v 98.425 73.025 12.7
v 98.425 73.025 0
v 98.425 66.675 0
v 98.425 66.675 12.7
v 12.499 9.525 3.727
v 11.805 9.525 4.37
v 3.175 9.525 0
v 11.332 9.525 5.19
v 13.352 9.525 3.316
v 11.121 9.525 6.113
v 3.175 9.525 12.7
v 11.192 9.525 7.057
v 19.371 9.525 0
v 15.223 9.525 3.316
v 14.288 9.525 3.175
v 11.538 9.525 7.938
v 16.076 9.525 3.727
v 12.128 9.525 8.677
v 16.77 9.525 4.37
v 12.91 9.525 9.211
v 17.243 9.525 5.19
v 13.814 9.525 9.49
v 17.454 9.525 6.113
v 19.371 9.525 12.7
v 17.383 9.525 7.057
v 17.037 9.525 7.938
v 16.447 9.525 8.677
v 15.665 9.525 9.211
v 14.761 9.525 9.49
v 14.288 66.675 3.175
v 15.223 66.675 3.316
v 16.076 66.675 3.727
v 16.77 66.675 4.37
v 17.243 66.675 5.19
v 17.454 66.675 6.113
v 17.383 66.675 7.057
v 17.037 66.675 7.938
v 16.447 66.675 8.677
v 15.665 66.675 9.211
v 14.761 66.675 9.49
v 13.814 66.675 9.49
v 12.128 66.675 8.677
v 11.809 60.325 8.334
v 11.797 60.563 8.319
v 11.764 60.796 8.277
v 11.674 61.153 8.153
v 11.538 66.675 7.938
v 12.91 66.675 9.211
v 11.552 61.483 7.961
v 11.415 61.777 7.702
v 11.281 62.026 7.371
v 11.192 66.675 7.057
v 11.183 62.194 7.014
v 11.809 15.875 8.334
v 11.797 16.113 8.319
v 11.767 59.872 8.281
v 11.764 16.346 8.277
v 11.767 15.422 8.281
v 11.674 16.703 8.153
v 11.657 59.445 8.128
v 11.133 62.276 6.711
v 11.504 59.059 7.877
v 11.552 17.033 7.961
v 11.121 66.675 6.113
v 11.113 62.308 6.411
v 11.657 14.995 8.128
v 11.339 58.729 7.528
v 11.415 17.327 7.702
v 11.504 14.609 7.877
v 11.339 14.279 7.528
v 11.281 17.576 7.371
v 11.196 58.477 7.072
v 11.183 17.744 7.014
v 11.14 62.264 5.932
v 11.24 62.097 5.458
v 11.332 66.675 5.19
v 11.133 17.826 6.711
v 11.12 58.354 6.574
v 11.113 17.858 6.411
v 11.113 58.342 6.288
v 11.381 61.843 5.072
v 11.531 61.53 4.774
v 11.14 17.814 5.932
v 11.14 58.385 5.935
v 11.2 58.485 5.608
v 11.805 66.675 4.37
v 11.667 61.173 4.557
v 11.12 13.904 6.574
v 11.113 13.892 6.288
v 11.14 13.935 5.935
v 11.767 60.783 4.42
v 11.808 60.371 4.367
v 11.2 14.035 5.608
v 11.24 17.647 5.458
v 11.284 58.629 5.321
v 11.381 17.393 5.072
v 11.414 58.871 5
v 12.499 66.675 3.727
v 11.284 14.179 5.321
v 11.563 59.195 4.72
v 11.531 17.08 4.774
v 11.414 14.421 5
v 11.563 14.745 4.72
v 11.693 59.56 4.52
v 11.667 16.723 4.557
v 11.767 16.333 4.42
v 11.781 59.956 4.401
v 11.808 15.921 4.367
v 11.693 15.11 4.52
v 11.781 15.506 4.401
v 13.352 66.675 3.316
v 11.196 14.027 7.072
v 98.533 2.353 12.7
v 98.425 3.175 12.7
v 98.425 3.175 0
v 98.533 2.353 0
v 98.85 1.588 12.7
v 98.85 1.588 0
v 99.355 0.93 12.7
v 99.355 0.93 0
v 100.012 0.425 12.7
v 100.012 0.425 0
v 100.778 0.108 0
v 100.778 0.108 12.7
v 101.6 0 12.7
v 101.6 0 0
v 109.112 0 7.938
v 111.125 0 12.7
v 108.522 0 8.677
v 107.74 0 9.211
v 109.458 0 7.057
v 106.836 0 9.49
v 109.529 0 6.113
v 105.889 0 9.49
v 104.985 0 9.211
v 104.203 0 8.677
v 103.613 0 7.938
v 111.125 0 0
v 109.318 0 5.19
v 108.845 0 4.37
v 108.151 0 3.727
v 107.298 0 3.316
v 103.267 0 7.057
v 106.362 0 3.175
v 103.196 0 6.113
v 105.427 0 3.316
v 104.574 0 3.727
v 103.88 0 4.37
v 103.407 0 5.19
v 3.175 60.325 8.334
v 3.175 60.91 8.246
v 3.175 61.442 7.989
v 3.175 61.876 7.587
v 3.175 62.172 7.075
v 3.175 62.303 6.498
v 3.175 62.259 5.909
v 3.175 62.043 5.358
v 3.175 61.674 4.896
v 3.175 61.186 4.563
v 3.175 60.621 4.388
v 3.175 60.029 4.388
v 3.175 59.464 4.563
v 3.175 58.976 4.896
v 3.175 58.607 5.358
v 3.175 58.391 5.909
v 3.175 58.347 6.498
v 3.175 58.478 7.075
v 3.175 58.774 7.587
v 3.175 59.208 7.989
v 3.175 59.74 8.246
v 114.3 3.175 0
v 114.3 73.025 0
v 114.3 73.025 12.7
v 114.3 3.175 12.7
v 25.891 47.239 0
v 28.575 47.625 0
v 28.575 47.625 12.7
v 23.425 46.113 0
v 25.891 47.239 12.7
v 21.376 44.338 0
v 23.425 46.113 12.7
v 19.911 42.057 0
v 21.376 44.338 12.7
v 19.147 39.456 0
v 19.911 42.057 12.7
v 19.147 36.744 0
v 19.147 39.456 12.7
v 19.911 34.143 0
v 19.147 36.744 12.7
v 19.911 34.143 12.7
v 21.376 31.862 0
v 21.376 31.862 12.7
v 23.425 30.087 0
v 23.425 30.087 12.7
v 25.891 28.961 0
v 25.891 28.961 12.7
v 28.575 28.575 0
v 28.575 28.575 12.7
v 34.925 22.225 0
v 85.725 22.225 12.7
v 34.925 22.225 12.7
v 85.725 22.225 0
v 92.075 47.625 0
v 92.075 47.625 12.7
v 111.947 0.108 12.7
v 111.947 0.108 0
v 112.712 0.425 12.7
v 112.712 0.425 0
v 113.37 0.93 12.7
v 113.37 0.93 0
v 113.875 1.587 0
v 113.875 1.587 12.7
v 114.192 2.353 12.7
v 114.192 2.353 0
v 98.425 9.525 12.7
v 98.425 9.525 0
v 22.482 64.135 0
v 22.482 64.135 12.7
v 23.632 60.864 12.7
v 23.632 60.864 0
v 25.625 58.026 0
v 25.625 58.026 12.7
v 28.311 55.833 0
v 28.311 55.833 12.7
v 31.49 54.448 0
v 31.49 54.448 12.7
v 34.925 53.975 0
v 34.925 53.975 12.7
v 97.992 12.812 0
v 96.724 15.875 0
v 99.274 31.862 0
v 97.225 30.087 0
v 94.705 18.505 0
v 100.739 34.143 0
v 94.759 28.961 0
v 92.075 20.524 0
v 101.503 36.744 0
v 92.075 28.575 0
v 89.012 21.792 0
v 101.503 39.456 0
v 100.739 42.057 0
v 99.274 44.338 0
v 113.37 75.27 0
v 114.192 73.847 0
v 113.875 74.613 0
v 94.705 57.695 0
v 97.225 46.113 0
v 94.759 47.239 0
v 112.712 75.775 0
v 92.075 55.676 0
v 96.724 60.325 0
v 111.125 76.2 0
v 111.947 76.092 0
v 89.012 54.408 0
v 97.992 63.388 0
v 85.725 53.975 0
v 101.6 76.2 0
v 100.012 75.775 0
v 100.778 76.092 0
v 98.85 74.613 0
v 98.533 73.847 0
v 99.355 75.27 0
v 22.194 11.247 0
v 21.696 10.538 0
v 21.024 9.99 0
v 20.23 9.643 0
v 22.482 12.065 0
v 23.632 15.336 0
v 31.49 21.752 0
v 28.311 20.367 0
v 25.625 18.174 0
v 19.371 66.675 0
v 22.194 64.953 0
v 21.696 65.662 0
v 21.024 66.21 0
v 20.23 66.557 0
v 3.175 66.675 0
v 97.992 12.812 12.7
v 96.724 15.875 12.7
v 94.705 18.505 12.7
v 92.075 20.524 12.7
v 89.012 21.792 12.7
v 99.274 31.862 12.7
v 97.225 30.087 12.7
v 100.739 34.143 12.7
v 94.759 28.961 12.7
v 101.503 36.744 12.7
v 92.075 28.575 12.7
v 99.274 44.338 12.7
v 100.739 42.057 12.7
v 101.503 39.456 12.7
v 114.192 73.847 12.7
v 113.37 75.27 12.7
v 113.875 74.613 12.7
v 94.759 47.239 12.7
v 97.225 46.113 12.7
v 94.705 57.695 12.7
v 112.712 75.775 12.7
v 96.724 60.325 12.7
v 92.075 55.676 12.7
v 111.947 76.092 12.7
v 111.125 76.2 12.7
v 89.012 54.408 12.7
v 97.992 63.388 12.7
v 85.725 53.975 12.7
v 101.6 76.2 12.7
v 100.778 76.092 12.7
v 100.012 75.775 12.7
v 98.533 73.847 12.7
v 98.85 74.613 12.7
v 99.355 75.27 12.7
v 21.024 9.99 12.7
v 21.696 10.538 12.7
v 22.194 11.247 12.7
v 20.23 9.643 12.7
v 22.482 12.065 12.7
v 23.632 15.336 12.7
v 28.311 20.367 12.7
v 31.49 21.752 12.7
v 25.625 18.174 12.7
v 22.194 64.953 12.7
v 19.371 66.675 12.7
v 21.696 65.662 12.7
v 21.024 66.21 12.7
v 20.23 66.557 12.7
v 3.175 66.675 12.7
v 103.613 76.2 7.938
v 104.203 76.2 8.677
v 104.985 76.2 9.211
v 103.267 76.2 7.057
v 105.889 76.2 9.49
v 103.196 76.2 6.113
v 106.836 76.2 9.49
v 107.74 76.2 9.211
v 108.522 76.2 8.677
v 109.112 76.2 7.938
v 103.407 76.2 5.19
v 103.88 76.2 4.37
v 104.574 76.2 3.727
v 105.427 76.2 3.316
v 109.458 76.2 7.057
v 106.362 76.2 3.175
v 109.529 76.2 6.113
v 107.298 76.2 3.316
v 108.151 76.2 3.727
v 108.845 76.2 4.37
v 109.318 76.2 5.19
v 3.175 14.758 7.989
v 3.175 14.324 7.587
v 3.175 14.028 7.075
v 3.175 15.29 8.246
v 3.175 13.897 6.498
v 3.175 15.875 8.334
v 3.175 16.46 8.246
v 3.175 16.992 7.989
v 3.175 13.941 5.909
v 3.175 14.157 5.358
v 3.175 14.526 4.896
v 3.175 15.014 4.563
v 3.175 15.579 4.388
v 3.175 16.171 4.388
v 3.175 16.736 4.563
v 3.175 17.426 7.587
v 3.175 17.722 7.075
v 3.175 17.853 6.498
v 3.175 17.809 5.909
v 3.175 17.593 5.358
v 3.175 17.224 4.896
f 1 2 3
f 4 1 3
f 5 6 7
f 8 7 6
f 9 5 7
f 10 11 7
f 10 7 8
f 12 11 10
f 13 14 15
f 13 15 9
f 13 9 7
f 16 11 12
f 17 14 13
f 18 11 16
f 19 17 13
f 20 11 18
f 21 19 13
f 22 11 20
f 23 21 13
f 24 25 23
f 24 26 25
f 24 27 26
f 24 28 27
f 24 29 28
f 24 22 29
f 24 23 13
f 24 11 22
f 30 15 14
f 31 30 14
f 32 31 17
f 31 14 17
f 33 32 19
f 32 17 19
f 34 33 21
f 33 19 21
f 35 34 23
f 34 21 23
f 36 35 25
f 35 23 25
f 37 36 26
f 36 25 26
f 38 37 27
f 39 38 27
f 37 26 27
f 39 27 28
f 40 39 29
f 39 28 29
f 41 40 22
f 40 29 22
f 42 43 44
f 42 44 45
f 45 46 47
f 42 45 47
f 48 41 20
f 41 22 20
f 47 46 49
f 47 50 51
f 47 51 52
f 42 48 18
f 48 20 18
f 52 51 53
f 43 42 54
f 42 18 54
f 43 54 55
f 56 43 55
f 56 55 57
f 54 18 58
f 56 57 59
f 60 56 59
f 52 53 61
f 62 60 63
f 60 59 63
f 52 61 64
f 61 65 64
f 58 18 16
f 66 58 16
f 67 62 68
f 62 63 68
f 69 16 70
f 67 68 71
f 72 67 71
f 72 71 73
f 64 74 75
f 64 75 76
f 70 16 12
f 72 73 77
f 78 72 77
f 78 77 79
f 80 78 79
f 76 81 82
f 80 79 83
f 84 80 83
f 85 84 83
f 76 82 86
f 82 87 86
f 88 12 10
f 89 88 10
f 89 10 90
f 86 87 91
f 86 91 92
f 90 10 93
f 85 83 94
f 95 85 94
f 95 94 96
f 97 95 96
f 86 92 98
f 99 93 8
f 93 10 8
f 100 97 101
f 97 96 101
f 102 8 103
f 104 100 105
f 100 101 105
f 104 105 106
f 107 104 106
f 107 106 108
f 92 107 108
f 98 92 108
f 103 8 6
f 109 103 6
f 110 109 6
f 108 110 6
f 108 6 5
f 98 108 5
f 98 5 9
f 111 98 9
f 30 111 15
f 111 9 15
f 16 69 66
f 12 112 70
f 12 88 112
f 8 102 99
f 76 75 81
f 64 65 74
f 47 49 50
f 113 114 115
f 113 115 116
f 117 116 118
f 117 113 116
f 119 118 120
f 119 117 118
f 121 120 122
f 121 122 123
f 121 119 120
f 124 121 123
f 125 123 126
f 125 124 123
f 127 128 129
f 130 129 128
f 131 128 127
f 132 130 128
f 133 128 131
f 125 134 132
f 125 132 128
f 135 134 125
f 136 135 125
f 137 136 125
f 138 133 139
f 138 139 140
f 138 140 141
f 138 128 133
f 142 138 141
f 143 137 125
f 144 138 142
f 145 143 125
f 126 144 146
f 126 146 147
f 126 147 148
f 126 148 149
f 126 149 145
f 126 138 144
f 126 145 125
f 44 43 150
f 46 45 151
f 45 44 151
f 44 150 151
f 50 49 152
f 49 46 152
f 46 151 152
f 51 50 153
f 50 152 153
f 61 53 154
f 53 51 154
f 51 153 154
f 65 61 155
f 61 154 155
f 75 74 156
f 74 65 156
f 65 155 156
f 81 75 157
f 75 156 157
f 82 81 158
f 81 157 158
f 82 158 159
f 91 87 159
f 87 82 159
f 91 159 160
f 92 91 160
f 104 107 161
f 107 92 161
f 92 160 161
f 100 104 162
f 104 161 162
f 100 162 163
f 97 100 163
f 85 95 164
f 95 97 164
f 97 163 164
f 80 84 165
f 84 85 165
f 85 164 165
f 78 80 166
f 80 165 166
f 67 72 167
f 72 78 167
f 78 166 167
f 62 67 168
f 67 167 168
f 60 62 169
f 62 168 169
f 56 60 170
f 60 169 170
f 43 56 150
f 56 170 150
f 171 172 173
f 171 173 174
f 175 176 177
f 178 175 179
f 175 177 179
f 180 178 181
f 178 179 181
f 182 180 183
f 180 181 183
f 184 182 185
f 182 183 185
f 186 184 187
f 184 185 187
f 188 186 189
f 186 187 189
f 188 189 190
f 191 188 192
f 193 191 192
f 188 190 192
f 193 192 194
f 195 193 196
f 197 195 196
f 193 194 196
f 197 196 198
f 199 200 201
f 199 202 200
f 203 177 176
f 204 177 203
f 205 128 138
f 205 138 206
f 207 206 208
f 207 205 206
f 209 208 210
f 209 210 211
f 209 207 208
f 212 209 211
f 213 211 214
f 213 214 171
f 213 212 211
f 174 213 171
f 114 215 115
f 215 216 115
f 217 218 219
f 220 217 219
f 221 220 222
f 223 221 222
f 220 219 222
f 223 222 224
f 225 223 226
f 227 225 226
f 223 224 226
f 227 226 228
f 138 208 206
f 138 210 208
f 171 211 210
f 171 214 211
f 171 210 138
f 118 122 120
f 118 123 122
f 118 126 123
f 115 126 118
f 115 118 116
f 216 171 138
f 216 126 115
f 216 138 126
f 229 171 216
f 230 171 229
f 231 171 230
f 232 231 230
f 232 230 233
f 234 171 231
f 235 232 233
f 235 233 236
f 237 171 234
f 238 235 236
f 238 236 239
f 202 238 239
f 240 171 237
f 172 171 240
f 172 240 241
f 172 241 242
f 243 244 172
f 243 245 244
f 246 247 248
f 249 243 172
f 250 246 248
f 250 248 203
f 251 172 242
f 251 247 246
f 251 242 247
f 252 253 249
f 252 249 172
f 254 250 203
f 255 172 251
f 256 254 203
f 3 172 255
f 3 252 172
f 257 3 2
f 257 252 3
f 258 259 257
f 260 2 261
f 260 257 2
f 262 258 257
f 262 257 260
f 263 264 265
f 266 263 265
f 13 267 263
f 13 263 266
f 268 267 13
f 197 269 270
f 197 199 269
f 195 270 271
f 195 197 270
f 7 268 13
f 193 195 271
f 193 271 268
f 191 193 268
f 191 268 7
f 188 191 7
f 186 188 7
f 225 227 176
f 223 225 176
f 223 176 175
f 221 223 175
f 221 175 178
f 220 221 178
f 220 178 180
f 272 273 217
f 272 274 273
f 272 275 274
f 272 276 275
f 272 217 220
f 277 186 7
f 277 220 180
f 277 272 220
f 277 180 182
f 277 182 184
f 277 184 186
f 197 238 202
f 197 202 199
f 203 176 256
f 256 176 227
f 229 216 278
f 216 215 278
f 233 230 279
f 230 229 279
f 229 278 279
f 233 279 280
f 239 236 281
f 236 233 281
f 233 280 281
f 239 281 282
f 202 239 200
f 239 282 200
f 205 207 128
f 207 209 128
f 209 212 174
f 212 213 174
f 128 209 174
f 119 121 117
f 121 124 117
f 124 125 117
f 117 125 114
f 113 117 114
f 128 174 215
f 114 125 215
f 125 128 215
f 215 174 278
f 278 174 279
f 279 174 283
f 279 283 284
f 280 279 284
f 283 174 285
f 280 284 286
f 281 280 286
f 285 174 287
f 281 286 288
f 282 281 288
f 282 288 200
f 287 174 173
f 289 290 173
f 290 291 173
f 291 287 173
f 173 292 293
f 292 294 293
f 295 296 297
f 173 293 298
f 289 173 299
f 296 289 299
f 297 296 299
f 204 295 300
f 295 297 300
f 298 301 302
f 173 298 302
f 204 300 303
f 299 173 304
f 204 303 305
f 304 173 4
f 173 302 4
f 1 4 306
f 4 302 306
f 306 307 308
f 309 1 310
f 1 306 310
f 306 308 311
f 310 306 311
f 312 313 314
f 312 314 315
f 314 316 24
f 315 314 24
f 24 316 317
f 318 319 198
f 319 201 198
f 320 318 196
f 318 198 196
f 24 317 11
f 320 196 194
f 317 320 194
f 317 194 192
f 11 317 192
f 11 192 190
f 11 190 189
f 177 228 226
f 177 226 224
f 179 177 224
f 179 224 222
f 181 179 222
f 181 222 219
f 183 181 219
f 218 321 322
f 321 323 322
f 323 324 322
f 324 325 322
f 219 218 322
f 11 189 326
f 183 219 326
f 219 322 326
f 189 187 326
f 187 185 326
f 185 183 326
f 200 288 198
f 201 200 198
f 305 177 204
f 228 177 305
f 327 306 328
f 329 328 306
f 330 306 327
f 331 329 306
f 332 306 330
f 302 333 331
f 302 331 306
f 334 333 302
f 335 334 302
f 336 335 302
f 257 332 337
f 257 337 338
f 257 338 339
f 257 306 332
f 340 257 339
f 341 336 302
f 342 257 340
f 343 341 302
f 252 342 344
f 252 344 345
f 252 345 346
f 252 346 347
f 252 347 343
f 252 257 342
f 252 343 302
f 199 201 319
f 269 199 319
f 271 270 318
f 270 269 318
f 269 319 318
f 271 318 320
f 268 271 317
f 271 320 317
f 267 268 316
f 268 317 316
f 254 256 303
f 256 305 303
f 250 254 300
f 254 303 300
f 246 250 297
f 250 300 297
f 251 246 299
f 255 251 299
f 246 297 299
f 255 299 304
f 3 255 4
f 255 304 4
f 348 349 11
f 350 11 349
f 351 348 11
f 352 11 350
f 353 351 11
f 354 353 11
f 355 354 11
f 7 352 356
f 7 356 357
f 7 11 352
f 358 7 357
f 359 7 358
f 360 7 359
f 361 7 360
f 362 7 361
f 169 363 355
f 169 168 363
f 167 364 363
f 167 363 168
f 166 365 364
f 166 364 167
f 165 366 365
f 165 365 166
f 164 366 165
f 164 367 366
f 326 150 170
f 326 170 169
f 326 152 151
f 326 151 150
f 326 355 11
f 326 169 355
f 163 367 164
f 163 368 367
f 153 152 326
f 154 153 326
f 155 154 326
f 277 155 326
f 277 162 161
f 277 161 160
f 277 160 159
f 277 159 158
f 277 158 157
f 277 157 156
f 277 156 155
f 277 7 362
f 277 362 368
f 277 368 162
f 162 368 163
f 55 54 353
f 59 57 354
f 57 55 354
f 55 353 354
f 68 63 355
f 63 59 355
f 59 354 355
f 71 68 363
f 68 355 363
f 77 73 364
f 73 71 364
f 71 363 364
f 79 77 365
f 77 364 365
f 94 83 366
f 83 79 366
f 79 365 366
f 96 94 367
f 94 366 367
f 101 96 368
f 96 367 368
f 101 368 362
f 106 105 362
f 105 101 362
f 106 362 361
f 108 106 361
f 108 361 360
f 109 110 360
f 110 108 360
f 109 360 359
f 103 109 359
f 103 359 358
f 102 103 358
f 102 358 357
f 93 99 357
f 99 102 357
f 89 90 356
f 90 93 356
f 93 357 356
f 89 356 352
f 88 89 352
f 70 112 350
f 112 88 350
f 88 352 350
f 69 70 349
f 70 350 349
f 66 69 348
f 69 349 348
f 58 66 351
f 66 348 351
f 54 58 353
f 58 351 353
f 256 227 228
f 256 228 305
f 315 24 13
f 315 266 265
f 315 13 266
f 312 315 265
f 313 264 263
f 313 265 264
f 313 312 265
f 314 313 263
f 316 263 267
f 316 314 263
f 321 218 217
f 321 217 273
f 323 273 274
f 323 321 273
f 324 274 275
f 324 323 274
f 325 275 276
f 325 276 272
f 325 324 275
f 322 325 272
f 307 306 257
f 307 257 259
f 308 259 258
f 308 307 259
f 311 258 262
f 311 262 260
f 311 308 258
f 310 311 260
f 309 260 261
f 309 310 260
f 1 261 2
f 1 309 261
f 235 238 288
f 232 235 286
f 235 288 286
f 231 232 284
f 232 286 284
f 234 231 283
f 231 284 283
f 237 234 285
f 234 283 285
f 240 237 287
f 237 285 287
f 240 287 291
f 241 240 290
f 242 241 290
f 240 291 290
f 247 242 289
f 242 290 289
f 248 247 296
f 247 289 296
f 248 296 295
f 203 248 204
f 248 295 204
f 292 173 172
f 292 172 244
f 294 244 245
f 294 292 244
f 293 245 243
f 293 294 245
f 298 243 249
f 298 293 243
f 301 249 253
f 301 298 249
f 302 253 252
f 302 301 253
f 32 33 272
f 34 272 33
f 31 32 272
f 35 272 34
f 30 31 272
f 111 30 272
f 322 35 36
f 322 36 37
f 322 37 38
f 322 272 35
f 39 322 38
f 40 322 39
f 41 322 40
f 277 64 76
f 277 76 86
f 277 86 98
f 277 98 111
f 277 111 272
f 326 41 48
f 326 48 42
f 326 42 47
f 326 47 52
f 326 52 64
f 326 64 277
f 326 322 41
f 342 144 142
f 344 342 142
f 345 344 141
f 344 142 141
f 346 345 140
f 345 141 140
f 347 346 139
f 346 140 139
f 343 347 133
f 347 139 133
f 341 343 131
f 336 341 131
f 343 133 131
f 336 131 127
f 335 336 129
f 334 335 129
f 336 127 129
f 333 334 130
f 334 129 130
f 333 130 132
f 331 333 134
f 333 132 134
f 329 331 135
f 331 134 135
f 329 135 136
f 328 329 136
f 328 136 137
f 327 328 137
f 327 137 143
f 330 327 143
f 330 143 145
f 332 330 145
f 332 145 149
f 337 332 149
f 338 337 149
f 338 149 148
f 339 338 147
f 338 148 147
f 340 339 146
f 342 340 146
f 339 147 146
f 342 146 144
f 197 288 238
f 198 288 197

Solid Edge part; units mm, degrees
sketch "Sketch1" plane through (0, 0, 0) normal (0, 0, 1) x (1, 0, 0)
  line L0 (6.35, 0) -> (6.35, 76.2)
  line L1 (6.35, 76.2) -> (22.225, 76.2)
  line L2 (22.225, 53.975) -> (22.225, 76.2)
  line L3 (22.225, 53.975) -> (98.425, 53.975)
  line L4 (98.425, 76.2) -> (98.425, 53.975)
  line L5 (98.425, 76.2) -> (114.3, 76.2)
  line L6 (114.3, 76.2) -> (114.3, 0)
  line L7 (114.3, 0) -> (98.425, 0)
  line L8 (98.425, 22.225) -> (98.425, 0)
  line L9 (98.425, 22.225) -> (22.225, 22.225)
  line L10 (22.225, 0) -> (22.225, 22.225)
  line L11 (22.225, 0) -> (6.35, 0)
  dimension "D1" = 76.2
  dimension "D2" = 15.875
  dimension "D3" = 22.225
  dimension "D4" = 107.95
  dimension "D5" = 31.75
extrude "Protrusion1" add sketch "Sketch1" along normal blind 12.7
hole "Hole_1" at (14.2875, 0, 6.35) direction (0, 1, 0) diameter 6.35 end through all
hole "Hole1" at (106.3625, 0, 6.35) direction (0, 1, 0) diameter 6.35 end through all
sketch "Sketch2" plane through (63.5, 38.1, 12.7) normal (0, 0, 1) x (1, 0, 0)
  line L0 (28.575, -9.525) -> (-34.925, -9.525)
  line L1 (-34.925, 9.525) -> (28.575, 9.525)
  arc A0 (-34.925, -9.525) -> (-34.925, 9.525) centre (-34.925, 0) cw
  arc A1 (28.575, 9.525) -> (28.575, -9.525) centre (28.575, 0) cw
extrude "Cutout1" cut sketch "Sketch2" against normal through all
fillet "Round_1" radius 12.7 4 edges at (22.225, 22.225, 6.35) (22.225, 53.975, 6.35) (98.425, 53.975, 6.35) (98.425, 22.225, 6.35)
sketch "Sketch3" plane through (60.325, 38.1, 12.7) normal (0, 0, 1) x (1, 0, 0)
  line L0 (-63.5, 38.1) -> (-63.5, -38.1)
  line L1 (-63.5, -38.1) -> (-50.8, -38.1)
  line L2 (-50.8, -38.1) -> (-50.8, 38.1)
  line L3 (-50.8, 38.1) -> (-63.5, 38.1)
  dimension "D1" = 9.525
  dimension "D2" = 12.7
extrude "ExtrudedProtrusion_2" add sketch "Sketch3" against normal blind 12.7
sketch "Sketch4" plane through (58.7375, 38.1, 12.7) normal (0, 0, 1) x (1, 0, 0)
  line L0 (-66.8536, -38.1) -> (-66.8536, -28.575)
  line L1 (-66.8536, -28.575) -> (-36.5125, -28.575)
  line L2 (-36.5125, -28.575) -> (-36.5125, -38.1)
  line L3 (-36.5125, -38.1) -> (-66.8536, -38.1)
  line L4 (-65.7913, 38.1) -> (-36.5125, 38.1)
  line L5 (-36.5125, 38.1) -> (-36.5125, 28.575)
  line L6 (-36.5125, 28.575) -> (-65.7913, 28.575)
  line L7 (-65.7913, 28.575) -> (-65.7913, 38.1)
  dimension "D1" = 9.525
  dimension "D2" = 9.525
extrude "Cutout2" cut sketch "Sketch4" against normal through all
fillet "Round_2" radius 3.175 8 edges at (98.425, 76.2, 6.35) (114.3, 76.2, 6.35) (114.3, 0, 6.35) (98.425, 0, 6.35) (22.225, 9.525, 6.35) (22.225, 66.675, 6.35) (-3.175, 66.675, 6.35) (-3.175, 9.525, 6.35)
sketch "Sketch5" plane through (55.5625, 38.1, 0) normal (0, 0, -1) x (0, 1, 0)
  line L0 (-38.1, -58.7375) -> (-38.1, -52.3875)
  line L1 (-38.1, -52.3875) -> (38.1, -52.3875)
  line L2 (38.1, -52.3875) -> (38.1, -58.7375)
  line L3 (38.1, -58.7375) -> (-38.1, -58.7375)
  dimension "D1" = 6.35
extrude "Cutout3" cut sketch "Sketch5" against normal through all
hole "Hole_11" at (3.175, 15.875, 6.35) direction (1, 0, 0) diameter 3.9675 end up to next
hole "Hole2" at (3.175, 60.325, 6.35) direction (1, 0, 0) diameter 3.9675 end up to next
properties part number "SR-03" material "Polyethylene, low density"
